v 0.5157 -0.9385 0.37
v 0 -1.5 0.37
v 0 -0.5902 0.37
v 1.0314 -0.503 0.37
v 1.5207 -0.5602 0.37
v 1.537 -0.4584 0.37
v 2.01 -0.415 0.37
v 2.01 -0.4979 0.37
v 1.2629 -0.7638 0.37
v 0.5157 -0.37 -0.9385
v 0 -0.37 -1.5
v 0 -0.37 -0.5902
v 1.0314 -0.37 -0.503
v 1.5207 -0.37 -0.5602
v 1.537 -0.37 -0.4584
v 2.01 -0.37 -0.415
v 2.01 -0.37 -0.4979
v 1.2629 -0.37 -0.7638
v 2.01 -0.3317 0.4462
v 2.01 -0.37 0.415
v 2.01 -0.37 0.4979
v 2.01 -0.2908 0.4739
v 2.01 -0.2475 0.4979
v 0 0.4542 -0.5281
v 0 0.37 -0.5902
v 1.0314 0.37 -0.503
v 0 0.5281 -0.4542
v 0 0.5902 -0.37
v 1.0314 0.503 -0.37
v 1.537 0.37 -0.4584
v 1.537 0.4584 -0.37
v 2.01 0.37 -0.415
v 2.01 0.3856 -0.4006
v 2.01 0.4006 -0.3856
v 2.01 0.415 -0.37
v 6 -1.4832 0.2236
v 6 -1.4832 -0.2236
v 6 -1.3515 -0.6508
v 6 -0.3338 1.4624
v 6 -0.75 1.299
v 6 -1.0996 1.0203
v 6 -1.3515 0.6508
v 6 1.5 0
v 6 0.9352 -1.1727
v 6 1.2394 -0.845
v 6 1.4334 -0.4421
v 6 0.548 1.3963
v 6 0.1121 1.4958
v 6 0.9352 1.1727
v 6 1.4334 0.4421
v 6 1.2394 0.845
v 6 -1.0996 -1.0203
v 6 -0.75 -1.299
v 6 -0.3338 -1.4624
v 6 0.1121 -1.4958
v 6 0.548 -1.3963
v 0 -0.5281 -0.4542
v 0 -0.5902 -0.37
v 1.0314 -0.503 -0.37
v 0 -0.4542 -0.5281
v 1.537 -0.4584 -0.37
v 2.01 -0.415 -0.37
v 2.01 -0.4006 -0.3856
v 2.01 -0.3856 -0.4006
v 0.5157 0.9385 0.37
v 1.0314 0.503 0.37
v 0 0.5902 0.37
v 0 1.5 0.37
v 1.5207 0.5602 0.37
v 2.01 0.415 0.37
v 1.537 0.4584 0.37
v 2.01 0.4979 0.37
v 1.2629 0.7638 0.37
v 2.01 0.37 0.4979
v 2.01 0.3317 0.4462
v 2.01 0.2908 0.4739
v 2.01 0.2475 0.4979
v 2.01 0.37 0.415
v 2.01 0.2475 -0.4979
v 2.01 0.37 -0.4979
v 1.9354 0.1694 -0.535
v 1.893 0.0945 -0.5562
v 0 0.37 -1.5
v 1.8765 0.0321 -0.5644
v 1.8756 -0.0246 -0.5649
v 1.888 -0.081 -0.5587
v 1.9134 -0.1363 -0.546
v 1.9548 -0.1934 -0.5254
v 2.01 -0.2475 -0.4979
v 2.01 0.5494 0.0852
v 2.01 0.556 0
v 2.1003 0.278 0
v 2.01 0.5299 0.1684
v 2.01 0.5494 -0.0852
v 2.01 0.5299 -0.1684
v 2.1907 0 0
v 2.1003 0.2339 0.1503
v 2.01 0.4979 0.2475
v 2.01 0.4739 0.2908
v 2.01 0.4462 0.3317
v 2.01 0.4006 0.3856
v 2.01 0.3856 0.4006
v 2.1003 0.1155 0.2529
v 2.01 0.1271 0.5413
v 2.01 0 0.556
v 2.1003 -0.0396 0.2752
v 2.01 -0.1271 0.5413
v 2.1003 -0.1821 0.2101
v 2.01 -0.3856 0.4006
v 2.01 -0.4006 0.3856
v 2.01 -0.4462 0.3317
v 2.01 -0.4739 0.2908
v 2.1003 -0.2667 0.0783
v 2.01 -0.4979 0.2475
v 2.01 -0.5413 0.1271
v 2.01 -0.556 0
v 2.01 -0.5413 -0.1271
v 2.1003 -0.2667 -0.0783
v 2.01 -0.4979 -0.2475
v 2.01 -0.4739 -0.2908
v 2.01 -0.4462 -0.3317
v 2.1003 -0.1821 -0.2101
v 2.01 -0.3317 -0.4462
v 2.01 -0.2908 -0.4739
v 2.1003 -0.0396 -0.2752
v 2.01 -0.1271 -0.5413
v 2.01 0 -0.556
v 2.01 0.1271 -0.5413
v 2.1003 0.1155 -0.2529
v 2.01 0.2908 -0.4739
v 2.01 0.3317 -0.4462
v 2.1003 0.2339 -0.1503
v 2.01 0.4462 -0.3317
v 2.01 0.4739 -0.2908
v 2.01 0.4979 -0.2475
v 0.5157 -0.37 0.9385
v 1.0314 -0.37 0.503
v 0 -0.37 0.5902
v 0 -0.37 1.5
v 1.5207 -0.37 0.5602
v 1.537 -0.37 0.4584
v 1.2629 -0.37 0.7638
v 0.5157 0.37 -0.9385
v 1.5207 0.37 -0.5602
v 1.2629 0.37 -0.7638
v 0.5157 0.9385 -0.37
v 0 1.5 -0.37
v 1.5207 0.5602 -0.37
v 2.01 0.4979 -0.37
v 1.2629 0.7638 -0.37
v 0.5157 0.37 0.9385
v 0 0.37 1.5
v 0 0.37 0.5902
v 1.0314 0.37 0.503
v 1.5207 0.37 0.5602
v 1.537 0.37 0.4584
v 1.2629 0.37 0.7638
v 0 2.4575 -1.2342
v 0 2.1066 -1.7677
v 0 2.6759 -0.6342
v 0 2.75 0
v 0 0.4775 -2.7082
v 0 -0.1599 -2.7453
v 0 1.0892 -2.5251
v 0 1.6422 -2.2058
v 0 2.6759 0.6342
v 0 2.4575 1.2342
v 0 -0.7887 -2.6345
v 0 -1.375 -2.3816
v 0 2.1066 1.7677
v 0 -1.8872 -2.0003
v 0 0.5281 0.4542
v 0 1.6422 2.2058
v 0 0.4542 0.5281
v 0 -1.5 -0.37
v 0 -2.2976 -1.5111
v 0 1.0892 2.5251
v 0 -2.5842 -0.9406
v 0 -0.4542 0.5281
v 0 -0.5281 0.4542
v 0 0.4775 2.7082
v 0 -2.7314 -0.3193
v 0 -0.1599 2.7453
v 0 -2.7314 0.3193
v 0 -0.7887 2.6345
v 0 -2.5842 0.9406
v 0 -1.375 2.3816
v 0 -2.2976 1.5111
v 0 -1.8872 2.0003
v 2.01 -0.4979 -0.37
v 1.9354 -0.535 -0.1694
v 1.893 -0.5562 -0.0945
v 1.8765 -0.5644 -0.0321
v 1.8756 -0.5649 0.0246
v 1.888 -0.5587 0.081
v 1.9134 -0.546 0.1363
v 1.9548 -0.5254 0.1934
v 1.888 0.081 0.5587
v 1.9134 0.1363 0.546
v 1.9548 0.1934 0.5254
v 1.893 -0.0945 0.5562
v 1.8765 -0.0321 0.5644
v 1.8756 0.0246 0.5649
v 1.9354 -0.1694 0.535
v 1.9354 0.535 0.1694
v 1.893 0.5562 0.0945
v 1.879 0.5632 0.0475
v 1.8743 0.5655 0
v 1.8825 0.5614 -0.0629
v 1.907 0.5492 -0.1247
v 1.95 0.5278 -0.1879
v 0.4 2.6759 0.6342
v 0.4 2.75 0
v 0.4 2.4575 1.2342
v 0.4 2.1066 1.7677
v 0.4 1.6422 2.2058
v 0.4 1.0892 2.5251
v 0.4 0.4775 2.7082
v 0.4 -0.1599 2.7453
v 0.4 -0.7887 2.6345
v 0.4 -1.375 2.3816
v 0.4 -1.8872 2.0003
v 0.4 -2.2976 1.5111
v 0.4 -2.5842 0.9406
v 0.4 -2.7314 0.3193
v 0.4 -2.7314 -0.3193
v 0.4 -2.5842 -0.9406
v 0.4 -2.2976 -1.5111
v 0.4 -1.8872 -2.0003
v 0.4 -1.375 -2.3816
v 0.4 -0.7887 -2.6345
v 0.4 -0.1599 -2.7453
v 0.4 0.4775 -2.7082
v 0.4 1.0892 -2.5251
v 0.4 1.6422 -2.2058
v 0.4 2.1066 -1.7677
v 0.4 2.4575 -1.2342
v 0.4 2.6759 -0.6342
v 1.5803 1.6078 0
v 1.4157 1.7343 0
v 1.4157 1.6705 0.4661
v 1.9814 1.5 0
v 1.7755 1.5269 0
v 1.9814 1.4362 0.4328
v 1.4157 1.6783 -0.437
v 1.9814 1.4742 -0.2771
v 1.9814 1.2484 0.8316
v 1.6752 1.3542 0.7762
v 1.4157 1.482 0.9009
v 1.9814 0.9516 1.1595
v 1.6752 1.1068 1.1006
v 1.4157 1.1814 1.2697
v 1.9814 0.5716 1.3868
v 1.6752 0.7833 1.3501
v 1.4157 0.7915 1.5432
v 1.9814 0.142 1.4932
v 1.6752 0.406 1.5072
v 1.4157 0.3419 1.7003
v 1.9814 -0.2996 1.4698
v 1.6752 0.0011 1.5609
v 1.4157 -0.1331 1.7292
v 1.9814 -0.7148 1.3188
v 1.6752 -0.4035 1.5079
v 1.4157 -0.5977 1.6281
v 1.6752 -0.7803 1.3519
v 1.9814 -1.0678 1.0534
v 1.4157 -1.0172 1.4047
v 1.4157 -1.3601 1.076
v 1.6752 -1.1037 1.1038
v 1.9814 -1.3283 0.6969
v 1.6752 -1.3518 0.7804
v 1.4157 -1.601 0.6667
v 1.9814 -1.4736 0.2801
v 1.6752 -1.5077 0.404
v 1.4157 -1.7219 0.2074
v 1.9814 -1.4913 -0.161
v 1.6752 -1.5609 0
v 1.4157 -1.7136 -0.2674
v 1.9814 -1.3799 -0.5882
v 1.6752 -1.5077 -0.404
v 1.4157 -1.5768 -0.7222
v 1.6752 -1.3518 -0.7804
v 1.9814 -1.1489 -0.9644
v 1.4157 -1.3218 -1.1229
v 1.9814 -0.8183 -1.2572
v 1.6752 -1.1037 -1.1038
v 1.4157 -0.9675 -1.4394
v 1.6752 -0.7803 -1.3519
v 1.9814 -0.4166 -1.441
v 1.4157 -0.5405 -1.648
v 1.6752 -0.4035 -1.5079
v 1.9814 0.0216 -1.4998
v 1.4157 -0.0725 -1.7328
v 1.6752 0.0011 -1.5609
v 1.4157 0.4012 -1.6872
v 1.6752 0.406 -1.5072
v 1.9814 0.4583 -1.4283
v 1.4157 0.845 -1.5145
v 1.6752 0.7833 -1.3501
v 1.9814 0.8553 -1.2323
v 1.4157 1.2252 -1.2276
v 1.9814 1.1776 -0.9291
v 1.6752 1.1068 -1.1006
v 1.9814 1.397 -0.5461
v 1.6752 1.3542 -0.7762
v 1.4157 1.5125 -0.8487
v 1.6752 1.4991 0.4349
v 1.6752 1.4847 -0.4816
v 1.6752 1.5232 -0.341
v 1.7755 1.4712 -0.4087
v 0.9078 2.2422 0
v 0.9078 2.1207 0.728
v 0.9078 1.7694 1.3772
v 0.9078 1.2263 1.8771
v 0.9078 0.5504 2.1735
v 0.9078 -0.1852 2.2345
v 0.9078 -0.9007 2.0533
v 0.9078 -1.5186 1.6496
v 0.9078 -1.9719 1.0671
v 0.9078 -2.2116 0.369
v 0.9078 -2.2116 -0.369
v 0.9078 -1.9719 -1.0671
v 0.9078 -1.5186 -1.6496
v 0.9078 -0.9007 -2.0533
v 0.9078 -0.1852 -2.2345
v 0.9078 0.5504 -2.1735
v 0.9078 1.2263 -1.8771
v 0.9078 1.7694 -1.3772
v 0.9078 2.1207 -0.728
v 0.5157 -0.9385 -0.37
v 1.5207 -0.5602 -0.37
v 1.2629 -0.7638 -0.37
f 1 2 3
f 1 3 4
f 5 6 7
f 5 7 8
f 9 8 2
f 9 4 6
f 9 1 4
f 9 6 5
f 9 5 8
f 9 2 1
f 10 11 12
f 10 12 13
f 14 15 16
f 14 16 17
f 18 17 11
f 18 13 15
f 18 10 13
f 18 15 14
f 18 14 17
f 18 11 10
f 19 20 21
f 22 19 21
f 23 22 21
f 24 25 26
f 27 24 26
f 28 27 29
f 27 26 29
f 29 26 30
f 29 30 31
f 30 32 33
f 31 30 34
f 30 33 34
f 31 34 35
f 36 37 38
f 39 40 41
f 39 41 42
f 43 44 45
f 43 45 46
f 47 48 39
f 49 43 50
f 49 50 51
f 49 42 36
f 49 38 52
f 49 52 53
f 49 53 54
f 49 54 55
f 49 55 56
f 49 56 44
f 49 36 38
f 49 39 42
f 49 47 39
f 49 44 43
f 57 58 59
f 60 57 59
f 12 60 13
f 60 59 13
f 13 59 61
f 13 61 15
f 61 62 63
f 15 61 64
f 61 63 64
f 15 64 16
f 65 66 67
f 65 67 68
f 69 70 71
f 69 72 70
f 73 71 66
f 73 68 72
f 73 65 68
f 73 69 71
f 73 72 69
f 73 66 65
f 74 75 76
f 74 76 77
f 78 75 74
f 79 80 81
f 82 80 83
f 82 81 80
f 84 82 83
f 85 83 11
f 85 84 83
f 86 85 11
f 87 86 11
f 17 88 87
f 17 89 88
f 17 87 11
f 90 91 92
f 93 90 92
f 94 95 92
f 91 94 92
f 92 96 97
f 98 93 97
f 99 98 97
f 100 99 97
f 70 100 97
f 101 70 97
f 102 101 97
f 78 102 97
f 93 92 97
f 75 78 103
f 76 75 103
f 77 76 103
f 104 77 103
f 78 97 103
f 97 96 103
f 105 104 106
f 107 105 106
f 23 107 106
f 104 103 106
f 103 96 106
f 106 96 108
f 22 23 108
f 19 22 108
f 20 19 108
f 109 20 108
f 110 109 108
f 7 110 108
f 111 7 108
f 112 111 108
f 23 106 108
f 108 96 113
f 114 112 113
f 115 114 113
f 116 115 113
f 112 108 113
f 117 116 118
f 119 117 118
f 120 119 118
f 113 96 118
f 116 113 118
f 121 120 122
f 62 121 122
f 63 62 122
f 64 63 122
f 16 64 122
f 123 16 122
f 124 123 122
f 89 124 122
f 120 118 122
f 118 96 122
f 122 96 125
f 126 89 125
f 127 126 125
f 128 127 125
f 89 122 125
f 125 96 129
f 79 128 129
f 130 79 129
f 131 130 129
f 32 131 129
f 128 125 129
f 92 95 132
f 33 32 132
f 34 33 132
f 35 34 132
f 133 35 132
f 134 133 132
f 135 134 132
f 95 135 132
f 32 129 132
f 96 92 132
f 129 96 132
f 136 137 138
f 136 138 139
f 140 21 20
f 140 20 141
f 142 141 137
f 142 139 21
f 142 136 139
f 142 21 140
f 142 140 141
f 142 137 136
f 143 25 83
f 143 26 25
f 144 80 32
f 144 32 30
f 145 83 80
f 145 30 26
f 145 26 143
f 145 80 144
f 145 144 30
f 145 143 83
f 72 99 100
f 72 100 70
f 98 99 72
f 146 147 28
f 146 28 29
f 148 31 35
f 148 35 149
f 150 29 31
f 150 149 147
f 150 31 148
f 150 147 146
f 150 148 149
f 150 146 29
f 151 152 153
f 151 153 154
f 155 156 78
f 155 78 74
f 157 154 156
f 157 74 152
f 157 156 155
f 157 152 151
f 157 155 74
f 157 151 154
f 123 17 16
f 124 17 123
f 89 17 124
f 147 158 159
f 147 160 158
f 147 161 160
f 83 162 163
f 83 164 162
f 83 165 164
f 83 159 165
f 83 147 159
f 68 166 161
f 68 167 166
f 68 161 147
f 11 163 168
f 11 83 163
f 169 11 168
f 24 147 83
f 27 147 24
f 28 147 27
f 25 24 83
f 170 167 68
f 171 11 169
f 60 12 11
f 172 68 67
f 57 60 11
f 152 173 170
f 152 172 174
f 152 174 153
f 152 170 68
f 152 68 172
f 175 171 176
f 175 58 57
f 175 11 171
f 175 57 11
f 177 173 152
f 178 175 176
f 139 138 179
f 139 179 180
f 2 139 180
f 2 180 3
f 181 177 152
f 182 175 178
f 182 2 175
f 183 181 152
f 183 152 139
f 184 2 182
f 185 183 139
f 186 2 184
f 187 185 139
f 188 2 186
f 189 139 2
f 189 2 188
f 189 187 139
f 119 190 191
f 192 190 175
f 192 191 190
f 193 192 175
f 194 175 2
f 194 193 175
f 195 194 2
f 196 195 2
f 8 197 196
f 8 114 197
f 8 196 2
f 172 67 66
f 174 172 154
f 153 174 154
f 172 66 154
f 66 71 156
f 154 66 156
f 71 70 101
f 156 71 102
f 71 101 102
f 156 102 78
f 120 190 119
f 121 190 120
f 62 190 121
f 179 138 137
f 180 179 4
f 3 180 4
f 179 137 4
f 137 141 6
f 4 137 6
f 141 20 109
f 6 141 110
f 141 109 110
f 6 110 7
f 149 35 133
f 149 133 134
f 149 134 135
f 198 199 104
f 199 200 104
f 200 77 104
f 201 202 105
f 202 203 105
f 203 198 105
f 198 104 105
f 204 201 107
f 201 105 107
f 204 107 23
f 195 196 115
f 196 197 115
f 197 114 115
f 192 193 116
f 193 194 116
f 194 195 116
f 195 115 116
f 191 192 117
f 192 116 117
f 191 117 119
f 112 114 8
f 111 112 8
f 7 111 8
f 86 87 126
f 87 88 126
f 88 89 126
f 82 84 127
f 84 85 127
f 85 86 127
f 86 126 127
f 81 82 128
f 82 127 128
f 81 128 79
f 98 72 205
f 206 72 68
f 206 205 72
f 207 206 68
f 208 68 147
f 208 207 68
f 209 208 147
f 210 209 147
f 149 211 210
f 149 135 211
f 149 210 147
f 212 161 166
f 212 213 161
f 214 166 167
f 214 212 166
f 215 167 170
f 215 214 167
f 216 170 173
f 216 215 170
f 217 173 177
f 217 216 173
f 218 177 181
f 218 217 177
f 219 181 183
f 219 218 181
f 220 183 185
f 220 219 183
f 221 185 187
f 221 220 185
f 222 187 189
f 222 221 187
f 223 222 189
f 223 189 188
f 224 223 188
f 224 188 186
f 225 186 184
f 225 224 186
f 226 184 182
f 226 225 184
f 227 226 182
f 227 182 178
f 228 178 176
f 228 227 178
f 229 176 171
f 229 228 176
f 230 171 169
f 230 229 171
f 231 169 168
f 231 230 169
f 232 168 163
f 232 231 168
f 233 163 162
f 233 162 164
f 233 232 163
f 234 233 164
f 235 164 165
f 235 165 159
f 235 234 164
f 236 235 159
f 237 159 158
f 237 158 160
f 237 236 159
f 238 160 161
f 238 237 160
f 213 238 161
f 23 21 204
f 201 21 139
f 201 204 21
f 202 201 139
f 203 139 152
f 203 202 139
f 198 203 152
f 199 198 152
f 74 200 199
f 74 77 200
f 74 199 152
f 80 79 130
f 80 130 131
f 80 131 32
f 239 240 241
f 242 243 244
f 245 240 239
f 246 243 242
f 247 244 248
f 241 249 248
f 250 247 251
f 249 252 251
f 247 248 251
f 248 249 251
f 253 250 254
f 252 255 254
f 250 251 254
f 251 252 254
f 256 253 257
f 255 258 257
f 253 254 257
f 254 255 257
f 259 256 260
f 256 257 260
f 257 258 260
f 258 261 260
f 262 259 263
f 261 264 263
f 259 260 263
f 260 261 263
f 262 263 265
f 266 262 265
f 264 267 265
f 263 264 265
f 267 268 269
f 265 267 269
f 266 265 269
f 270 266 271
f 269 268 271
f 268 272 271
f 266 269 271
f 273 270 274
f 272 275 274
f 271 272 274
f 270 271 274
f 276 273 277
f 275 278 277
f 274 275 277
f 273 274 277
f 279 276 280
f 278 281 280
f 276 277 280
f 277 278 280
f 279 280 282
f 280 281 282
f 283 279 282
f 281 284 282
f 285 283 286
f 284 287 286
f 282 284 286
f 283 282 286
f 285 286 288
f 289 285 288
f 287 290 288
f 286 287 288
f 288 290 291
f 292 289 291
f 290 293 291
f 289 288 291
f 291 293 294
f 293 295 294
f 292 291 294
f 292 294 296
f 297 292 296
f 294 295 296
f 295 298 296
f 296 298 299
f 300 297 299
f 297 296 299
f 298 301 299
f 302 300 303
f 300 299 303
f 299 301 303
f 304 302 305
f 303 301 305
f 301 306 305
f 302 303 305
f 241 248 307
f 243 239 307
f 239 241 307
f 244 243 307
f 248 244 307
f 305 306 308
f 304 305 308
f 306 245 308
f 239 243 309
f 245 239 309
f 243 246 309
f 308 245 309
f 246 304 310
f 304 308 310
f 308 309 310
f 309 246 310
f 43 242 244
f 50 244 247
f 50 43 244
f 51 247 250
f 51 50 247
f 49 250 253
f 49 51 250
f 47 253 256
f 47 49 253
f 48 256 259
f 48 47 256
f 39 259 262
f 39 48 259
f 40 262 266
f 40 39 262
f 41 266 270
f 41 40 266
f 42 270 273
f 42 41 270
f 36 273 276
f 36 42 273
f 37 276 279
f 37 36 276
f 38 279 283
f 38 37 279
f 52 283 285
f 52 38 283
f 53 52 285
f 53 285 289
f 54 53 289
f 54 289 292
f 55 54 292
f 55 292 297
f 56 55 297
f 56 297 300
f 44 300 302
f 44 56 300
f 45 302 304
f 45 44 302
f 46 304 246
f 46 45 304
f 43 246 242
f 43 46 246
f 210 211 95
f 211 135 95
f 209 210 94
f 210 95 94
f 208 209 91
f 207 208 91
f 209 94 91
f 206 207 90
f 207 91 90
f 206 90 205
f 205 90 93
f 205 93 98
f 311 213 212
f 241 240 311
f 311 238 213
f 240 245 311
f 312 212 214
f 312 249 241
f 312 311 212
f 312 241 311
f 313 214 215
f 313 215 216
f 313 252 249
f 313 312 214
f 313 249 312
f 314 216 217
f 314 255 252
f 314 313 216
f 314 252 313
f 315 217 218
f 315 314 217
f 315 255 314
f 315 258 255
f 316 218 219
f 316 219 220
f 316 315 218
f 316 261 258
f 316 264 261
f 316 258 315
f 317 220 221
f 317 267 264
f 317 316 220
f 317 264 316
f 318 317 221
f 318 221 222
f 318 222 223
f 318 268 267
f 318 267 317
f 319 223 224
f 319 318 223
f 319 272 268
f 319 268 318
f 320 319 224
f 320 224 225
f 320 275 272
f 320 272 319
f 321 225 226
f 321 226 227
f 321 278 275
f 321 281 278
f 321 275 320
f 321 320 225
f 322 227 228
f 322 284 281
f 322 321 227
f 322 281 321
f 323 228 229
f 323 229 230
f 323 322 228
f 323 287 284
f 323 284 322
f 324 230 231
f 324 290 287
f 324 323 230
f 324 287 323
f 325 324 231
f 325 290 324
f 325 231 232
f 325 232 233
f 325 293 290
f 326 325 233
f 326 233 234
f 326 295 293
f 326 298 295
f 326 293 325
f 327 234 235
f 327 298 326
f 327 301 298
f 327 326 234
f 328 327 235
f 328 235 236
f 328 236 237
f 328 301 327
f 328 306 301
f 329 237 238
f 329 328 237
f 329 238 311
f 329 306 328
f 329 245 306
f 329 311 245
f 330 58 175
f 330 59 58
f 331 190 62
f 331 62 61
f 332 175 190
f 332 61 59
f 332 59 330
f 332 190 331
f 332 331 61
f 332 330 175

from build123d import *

# Parameters (mm, degrees)
FILLET1_R    = 0.8
SKETCH3_W    = 0.74
SKETCH3_H    = 3
SKETCH4_W    = 0.74
SKETCH4_H    = 0.995702004
RECPAT_COUNT = 2
RECPAT_ANGLE = 90


with BuildPart() as part:
    # BodySke → Base-Revolve (revolve)
    with BuildSketch(Plane.XY):
        Polygon((0, 0), (0, 2.75), (0.4, 2.75), (1.65, 1.5), (6, 1.5), (6, 0), align=None)
    revolve(axis=Axis((-6.35, 0, 0), (1, 0, 0)))

    # Fillet1
    fillet1_edges = [part.edges().sort_by_distance(p)[0] for p in [
        (1.65, -1.5, 0),
    ]]
    fillet(fillet1_edges, radius=FILLET1_R)

    # Sketch3 → Recess section 0
    with BuildSketch(Plane.ZY):
        Rectangle(SKETCH3_W, SKETCH3_H)
    # Sketch4 → Recess section 1
    with BuildSketch(Plane.ZY.offset(-2.01)):
        Rectangle(SKETCH4_W, SKETCH4_H)
    recess = loft(mode=Mode.SUBTRACT)

    # RecPat: Recess ×2 about axis
    recpat_axis = Axis((0, 0, 0), (1, 0, 0))
    for i in range(1, RECPAT_COUNT):
        add(recess.rotate(recpat_axis, i * RECPAT_ANGLE / (RECPAT_COUNT - 1)), mode=Mode.SUBTRACT)

    # RecCorSke → RecessCore (revolve, cut)
    with BuildSketch(Plane.XY):
        Polygon((0, 0), (0, 0.696552892), (2.01, 0.556), (2.190655351, 0), align=None)
    revolve(axis=Axis((-3.175, 0, 0), (1, 0, 0)), mode=Mode.SUBTRACT)


solid = part.part
